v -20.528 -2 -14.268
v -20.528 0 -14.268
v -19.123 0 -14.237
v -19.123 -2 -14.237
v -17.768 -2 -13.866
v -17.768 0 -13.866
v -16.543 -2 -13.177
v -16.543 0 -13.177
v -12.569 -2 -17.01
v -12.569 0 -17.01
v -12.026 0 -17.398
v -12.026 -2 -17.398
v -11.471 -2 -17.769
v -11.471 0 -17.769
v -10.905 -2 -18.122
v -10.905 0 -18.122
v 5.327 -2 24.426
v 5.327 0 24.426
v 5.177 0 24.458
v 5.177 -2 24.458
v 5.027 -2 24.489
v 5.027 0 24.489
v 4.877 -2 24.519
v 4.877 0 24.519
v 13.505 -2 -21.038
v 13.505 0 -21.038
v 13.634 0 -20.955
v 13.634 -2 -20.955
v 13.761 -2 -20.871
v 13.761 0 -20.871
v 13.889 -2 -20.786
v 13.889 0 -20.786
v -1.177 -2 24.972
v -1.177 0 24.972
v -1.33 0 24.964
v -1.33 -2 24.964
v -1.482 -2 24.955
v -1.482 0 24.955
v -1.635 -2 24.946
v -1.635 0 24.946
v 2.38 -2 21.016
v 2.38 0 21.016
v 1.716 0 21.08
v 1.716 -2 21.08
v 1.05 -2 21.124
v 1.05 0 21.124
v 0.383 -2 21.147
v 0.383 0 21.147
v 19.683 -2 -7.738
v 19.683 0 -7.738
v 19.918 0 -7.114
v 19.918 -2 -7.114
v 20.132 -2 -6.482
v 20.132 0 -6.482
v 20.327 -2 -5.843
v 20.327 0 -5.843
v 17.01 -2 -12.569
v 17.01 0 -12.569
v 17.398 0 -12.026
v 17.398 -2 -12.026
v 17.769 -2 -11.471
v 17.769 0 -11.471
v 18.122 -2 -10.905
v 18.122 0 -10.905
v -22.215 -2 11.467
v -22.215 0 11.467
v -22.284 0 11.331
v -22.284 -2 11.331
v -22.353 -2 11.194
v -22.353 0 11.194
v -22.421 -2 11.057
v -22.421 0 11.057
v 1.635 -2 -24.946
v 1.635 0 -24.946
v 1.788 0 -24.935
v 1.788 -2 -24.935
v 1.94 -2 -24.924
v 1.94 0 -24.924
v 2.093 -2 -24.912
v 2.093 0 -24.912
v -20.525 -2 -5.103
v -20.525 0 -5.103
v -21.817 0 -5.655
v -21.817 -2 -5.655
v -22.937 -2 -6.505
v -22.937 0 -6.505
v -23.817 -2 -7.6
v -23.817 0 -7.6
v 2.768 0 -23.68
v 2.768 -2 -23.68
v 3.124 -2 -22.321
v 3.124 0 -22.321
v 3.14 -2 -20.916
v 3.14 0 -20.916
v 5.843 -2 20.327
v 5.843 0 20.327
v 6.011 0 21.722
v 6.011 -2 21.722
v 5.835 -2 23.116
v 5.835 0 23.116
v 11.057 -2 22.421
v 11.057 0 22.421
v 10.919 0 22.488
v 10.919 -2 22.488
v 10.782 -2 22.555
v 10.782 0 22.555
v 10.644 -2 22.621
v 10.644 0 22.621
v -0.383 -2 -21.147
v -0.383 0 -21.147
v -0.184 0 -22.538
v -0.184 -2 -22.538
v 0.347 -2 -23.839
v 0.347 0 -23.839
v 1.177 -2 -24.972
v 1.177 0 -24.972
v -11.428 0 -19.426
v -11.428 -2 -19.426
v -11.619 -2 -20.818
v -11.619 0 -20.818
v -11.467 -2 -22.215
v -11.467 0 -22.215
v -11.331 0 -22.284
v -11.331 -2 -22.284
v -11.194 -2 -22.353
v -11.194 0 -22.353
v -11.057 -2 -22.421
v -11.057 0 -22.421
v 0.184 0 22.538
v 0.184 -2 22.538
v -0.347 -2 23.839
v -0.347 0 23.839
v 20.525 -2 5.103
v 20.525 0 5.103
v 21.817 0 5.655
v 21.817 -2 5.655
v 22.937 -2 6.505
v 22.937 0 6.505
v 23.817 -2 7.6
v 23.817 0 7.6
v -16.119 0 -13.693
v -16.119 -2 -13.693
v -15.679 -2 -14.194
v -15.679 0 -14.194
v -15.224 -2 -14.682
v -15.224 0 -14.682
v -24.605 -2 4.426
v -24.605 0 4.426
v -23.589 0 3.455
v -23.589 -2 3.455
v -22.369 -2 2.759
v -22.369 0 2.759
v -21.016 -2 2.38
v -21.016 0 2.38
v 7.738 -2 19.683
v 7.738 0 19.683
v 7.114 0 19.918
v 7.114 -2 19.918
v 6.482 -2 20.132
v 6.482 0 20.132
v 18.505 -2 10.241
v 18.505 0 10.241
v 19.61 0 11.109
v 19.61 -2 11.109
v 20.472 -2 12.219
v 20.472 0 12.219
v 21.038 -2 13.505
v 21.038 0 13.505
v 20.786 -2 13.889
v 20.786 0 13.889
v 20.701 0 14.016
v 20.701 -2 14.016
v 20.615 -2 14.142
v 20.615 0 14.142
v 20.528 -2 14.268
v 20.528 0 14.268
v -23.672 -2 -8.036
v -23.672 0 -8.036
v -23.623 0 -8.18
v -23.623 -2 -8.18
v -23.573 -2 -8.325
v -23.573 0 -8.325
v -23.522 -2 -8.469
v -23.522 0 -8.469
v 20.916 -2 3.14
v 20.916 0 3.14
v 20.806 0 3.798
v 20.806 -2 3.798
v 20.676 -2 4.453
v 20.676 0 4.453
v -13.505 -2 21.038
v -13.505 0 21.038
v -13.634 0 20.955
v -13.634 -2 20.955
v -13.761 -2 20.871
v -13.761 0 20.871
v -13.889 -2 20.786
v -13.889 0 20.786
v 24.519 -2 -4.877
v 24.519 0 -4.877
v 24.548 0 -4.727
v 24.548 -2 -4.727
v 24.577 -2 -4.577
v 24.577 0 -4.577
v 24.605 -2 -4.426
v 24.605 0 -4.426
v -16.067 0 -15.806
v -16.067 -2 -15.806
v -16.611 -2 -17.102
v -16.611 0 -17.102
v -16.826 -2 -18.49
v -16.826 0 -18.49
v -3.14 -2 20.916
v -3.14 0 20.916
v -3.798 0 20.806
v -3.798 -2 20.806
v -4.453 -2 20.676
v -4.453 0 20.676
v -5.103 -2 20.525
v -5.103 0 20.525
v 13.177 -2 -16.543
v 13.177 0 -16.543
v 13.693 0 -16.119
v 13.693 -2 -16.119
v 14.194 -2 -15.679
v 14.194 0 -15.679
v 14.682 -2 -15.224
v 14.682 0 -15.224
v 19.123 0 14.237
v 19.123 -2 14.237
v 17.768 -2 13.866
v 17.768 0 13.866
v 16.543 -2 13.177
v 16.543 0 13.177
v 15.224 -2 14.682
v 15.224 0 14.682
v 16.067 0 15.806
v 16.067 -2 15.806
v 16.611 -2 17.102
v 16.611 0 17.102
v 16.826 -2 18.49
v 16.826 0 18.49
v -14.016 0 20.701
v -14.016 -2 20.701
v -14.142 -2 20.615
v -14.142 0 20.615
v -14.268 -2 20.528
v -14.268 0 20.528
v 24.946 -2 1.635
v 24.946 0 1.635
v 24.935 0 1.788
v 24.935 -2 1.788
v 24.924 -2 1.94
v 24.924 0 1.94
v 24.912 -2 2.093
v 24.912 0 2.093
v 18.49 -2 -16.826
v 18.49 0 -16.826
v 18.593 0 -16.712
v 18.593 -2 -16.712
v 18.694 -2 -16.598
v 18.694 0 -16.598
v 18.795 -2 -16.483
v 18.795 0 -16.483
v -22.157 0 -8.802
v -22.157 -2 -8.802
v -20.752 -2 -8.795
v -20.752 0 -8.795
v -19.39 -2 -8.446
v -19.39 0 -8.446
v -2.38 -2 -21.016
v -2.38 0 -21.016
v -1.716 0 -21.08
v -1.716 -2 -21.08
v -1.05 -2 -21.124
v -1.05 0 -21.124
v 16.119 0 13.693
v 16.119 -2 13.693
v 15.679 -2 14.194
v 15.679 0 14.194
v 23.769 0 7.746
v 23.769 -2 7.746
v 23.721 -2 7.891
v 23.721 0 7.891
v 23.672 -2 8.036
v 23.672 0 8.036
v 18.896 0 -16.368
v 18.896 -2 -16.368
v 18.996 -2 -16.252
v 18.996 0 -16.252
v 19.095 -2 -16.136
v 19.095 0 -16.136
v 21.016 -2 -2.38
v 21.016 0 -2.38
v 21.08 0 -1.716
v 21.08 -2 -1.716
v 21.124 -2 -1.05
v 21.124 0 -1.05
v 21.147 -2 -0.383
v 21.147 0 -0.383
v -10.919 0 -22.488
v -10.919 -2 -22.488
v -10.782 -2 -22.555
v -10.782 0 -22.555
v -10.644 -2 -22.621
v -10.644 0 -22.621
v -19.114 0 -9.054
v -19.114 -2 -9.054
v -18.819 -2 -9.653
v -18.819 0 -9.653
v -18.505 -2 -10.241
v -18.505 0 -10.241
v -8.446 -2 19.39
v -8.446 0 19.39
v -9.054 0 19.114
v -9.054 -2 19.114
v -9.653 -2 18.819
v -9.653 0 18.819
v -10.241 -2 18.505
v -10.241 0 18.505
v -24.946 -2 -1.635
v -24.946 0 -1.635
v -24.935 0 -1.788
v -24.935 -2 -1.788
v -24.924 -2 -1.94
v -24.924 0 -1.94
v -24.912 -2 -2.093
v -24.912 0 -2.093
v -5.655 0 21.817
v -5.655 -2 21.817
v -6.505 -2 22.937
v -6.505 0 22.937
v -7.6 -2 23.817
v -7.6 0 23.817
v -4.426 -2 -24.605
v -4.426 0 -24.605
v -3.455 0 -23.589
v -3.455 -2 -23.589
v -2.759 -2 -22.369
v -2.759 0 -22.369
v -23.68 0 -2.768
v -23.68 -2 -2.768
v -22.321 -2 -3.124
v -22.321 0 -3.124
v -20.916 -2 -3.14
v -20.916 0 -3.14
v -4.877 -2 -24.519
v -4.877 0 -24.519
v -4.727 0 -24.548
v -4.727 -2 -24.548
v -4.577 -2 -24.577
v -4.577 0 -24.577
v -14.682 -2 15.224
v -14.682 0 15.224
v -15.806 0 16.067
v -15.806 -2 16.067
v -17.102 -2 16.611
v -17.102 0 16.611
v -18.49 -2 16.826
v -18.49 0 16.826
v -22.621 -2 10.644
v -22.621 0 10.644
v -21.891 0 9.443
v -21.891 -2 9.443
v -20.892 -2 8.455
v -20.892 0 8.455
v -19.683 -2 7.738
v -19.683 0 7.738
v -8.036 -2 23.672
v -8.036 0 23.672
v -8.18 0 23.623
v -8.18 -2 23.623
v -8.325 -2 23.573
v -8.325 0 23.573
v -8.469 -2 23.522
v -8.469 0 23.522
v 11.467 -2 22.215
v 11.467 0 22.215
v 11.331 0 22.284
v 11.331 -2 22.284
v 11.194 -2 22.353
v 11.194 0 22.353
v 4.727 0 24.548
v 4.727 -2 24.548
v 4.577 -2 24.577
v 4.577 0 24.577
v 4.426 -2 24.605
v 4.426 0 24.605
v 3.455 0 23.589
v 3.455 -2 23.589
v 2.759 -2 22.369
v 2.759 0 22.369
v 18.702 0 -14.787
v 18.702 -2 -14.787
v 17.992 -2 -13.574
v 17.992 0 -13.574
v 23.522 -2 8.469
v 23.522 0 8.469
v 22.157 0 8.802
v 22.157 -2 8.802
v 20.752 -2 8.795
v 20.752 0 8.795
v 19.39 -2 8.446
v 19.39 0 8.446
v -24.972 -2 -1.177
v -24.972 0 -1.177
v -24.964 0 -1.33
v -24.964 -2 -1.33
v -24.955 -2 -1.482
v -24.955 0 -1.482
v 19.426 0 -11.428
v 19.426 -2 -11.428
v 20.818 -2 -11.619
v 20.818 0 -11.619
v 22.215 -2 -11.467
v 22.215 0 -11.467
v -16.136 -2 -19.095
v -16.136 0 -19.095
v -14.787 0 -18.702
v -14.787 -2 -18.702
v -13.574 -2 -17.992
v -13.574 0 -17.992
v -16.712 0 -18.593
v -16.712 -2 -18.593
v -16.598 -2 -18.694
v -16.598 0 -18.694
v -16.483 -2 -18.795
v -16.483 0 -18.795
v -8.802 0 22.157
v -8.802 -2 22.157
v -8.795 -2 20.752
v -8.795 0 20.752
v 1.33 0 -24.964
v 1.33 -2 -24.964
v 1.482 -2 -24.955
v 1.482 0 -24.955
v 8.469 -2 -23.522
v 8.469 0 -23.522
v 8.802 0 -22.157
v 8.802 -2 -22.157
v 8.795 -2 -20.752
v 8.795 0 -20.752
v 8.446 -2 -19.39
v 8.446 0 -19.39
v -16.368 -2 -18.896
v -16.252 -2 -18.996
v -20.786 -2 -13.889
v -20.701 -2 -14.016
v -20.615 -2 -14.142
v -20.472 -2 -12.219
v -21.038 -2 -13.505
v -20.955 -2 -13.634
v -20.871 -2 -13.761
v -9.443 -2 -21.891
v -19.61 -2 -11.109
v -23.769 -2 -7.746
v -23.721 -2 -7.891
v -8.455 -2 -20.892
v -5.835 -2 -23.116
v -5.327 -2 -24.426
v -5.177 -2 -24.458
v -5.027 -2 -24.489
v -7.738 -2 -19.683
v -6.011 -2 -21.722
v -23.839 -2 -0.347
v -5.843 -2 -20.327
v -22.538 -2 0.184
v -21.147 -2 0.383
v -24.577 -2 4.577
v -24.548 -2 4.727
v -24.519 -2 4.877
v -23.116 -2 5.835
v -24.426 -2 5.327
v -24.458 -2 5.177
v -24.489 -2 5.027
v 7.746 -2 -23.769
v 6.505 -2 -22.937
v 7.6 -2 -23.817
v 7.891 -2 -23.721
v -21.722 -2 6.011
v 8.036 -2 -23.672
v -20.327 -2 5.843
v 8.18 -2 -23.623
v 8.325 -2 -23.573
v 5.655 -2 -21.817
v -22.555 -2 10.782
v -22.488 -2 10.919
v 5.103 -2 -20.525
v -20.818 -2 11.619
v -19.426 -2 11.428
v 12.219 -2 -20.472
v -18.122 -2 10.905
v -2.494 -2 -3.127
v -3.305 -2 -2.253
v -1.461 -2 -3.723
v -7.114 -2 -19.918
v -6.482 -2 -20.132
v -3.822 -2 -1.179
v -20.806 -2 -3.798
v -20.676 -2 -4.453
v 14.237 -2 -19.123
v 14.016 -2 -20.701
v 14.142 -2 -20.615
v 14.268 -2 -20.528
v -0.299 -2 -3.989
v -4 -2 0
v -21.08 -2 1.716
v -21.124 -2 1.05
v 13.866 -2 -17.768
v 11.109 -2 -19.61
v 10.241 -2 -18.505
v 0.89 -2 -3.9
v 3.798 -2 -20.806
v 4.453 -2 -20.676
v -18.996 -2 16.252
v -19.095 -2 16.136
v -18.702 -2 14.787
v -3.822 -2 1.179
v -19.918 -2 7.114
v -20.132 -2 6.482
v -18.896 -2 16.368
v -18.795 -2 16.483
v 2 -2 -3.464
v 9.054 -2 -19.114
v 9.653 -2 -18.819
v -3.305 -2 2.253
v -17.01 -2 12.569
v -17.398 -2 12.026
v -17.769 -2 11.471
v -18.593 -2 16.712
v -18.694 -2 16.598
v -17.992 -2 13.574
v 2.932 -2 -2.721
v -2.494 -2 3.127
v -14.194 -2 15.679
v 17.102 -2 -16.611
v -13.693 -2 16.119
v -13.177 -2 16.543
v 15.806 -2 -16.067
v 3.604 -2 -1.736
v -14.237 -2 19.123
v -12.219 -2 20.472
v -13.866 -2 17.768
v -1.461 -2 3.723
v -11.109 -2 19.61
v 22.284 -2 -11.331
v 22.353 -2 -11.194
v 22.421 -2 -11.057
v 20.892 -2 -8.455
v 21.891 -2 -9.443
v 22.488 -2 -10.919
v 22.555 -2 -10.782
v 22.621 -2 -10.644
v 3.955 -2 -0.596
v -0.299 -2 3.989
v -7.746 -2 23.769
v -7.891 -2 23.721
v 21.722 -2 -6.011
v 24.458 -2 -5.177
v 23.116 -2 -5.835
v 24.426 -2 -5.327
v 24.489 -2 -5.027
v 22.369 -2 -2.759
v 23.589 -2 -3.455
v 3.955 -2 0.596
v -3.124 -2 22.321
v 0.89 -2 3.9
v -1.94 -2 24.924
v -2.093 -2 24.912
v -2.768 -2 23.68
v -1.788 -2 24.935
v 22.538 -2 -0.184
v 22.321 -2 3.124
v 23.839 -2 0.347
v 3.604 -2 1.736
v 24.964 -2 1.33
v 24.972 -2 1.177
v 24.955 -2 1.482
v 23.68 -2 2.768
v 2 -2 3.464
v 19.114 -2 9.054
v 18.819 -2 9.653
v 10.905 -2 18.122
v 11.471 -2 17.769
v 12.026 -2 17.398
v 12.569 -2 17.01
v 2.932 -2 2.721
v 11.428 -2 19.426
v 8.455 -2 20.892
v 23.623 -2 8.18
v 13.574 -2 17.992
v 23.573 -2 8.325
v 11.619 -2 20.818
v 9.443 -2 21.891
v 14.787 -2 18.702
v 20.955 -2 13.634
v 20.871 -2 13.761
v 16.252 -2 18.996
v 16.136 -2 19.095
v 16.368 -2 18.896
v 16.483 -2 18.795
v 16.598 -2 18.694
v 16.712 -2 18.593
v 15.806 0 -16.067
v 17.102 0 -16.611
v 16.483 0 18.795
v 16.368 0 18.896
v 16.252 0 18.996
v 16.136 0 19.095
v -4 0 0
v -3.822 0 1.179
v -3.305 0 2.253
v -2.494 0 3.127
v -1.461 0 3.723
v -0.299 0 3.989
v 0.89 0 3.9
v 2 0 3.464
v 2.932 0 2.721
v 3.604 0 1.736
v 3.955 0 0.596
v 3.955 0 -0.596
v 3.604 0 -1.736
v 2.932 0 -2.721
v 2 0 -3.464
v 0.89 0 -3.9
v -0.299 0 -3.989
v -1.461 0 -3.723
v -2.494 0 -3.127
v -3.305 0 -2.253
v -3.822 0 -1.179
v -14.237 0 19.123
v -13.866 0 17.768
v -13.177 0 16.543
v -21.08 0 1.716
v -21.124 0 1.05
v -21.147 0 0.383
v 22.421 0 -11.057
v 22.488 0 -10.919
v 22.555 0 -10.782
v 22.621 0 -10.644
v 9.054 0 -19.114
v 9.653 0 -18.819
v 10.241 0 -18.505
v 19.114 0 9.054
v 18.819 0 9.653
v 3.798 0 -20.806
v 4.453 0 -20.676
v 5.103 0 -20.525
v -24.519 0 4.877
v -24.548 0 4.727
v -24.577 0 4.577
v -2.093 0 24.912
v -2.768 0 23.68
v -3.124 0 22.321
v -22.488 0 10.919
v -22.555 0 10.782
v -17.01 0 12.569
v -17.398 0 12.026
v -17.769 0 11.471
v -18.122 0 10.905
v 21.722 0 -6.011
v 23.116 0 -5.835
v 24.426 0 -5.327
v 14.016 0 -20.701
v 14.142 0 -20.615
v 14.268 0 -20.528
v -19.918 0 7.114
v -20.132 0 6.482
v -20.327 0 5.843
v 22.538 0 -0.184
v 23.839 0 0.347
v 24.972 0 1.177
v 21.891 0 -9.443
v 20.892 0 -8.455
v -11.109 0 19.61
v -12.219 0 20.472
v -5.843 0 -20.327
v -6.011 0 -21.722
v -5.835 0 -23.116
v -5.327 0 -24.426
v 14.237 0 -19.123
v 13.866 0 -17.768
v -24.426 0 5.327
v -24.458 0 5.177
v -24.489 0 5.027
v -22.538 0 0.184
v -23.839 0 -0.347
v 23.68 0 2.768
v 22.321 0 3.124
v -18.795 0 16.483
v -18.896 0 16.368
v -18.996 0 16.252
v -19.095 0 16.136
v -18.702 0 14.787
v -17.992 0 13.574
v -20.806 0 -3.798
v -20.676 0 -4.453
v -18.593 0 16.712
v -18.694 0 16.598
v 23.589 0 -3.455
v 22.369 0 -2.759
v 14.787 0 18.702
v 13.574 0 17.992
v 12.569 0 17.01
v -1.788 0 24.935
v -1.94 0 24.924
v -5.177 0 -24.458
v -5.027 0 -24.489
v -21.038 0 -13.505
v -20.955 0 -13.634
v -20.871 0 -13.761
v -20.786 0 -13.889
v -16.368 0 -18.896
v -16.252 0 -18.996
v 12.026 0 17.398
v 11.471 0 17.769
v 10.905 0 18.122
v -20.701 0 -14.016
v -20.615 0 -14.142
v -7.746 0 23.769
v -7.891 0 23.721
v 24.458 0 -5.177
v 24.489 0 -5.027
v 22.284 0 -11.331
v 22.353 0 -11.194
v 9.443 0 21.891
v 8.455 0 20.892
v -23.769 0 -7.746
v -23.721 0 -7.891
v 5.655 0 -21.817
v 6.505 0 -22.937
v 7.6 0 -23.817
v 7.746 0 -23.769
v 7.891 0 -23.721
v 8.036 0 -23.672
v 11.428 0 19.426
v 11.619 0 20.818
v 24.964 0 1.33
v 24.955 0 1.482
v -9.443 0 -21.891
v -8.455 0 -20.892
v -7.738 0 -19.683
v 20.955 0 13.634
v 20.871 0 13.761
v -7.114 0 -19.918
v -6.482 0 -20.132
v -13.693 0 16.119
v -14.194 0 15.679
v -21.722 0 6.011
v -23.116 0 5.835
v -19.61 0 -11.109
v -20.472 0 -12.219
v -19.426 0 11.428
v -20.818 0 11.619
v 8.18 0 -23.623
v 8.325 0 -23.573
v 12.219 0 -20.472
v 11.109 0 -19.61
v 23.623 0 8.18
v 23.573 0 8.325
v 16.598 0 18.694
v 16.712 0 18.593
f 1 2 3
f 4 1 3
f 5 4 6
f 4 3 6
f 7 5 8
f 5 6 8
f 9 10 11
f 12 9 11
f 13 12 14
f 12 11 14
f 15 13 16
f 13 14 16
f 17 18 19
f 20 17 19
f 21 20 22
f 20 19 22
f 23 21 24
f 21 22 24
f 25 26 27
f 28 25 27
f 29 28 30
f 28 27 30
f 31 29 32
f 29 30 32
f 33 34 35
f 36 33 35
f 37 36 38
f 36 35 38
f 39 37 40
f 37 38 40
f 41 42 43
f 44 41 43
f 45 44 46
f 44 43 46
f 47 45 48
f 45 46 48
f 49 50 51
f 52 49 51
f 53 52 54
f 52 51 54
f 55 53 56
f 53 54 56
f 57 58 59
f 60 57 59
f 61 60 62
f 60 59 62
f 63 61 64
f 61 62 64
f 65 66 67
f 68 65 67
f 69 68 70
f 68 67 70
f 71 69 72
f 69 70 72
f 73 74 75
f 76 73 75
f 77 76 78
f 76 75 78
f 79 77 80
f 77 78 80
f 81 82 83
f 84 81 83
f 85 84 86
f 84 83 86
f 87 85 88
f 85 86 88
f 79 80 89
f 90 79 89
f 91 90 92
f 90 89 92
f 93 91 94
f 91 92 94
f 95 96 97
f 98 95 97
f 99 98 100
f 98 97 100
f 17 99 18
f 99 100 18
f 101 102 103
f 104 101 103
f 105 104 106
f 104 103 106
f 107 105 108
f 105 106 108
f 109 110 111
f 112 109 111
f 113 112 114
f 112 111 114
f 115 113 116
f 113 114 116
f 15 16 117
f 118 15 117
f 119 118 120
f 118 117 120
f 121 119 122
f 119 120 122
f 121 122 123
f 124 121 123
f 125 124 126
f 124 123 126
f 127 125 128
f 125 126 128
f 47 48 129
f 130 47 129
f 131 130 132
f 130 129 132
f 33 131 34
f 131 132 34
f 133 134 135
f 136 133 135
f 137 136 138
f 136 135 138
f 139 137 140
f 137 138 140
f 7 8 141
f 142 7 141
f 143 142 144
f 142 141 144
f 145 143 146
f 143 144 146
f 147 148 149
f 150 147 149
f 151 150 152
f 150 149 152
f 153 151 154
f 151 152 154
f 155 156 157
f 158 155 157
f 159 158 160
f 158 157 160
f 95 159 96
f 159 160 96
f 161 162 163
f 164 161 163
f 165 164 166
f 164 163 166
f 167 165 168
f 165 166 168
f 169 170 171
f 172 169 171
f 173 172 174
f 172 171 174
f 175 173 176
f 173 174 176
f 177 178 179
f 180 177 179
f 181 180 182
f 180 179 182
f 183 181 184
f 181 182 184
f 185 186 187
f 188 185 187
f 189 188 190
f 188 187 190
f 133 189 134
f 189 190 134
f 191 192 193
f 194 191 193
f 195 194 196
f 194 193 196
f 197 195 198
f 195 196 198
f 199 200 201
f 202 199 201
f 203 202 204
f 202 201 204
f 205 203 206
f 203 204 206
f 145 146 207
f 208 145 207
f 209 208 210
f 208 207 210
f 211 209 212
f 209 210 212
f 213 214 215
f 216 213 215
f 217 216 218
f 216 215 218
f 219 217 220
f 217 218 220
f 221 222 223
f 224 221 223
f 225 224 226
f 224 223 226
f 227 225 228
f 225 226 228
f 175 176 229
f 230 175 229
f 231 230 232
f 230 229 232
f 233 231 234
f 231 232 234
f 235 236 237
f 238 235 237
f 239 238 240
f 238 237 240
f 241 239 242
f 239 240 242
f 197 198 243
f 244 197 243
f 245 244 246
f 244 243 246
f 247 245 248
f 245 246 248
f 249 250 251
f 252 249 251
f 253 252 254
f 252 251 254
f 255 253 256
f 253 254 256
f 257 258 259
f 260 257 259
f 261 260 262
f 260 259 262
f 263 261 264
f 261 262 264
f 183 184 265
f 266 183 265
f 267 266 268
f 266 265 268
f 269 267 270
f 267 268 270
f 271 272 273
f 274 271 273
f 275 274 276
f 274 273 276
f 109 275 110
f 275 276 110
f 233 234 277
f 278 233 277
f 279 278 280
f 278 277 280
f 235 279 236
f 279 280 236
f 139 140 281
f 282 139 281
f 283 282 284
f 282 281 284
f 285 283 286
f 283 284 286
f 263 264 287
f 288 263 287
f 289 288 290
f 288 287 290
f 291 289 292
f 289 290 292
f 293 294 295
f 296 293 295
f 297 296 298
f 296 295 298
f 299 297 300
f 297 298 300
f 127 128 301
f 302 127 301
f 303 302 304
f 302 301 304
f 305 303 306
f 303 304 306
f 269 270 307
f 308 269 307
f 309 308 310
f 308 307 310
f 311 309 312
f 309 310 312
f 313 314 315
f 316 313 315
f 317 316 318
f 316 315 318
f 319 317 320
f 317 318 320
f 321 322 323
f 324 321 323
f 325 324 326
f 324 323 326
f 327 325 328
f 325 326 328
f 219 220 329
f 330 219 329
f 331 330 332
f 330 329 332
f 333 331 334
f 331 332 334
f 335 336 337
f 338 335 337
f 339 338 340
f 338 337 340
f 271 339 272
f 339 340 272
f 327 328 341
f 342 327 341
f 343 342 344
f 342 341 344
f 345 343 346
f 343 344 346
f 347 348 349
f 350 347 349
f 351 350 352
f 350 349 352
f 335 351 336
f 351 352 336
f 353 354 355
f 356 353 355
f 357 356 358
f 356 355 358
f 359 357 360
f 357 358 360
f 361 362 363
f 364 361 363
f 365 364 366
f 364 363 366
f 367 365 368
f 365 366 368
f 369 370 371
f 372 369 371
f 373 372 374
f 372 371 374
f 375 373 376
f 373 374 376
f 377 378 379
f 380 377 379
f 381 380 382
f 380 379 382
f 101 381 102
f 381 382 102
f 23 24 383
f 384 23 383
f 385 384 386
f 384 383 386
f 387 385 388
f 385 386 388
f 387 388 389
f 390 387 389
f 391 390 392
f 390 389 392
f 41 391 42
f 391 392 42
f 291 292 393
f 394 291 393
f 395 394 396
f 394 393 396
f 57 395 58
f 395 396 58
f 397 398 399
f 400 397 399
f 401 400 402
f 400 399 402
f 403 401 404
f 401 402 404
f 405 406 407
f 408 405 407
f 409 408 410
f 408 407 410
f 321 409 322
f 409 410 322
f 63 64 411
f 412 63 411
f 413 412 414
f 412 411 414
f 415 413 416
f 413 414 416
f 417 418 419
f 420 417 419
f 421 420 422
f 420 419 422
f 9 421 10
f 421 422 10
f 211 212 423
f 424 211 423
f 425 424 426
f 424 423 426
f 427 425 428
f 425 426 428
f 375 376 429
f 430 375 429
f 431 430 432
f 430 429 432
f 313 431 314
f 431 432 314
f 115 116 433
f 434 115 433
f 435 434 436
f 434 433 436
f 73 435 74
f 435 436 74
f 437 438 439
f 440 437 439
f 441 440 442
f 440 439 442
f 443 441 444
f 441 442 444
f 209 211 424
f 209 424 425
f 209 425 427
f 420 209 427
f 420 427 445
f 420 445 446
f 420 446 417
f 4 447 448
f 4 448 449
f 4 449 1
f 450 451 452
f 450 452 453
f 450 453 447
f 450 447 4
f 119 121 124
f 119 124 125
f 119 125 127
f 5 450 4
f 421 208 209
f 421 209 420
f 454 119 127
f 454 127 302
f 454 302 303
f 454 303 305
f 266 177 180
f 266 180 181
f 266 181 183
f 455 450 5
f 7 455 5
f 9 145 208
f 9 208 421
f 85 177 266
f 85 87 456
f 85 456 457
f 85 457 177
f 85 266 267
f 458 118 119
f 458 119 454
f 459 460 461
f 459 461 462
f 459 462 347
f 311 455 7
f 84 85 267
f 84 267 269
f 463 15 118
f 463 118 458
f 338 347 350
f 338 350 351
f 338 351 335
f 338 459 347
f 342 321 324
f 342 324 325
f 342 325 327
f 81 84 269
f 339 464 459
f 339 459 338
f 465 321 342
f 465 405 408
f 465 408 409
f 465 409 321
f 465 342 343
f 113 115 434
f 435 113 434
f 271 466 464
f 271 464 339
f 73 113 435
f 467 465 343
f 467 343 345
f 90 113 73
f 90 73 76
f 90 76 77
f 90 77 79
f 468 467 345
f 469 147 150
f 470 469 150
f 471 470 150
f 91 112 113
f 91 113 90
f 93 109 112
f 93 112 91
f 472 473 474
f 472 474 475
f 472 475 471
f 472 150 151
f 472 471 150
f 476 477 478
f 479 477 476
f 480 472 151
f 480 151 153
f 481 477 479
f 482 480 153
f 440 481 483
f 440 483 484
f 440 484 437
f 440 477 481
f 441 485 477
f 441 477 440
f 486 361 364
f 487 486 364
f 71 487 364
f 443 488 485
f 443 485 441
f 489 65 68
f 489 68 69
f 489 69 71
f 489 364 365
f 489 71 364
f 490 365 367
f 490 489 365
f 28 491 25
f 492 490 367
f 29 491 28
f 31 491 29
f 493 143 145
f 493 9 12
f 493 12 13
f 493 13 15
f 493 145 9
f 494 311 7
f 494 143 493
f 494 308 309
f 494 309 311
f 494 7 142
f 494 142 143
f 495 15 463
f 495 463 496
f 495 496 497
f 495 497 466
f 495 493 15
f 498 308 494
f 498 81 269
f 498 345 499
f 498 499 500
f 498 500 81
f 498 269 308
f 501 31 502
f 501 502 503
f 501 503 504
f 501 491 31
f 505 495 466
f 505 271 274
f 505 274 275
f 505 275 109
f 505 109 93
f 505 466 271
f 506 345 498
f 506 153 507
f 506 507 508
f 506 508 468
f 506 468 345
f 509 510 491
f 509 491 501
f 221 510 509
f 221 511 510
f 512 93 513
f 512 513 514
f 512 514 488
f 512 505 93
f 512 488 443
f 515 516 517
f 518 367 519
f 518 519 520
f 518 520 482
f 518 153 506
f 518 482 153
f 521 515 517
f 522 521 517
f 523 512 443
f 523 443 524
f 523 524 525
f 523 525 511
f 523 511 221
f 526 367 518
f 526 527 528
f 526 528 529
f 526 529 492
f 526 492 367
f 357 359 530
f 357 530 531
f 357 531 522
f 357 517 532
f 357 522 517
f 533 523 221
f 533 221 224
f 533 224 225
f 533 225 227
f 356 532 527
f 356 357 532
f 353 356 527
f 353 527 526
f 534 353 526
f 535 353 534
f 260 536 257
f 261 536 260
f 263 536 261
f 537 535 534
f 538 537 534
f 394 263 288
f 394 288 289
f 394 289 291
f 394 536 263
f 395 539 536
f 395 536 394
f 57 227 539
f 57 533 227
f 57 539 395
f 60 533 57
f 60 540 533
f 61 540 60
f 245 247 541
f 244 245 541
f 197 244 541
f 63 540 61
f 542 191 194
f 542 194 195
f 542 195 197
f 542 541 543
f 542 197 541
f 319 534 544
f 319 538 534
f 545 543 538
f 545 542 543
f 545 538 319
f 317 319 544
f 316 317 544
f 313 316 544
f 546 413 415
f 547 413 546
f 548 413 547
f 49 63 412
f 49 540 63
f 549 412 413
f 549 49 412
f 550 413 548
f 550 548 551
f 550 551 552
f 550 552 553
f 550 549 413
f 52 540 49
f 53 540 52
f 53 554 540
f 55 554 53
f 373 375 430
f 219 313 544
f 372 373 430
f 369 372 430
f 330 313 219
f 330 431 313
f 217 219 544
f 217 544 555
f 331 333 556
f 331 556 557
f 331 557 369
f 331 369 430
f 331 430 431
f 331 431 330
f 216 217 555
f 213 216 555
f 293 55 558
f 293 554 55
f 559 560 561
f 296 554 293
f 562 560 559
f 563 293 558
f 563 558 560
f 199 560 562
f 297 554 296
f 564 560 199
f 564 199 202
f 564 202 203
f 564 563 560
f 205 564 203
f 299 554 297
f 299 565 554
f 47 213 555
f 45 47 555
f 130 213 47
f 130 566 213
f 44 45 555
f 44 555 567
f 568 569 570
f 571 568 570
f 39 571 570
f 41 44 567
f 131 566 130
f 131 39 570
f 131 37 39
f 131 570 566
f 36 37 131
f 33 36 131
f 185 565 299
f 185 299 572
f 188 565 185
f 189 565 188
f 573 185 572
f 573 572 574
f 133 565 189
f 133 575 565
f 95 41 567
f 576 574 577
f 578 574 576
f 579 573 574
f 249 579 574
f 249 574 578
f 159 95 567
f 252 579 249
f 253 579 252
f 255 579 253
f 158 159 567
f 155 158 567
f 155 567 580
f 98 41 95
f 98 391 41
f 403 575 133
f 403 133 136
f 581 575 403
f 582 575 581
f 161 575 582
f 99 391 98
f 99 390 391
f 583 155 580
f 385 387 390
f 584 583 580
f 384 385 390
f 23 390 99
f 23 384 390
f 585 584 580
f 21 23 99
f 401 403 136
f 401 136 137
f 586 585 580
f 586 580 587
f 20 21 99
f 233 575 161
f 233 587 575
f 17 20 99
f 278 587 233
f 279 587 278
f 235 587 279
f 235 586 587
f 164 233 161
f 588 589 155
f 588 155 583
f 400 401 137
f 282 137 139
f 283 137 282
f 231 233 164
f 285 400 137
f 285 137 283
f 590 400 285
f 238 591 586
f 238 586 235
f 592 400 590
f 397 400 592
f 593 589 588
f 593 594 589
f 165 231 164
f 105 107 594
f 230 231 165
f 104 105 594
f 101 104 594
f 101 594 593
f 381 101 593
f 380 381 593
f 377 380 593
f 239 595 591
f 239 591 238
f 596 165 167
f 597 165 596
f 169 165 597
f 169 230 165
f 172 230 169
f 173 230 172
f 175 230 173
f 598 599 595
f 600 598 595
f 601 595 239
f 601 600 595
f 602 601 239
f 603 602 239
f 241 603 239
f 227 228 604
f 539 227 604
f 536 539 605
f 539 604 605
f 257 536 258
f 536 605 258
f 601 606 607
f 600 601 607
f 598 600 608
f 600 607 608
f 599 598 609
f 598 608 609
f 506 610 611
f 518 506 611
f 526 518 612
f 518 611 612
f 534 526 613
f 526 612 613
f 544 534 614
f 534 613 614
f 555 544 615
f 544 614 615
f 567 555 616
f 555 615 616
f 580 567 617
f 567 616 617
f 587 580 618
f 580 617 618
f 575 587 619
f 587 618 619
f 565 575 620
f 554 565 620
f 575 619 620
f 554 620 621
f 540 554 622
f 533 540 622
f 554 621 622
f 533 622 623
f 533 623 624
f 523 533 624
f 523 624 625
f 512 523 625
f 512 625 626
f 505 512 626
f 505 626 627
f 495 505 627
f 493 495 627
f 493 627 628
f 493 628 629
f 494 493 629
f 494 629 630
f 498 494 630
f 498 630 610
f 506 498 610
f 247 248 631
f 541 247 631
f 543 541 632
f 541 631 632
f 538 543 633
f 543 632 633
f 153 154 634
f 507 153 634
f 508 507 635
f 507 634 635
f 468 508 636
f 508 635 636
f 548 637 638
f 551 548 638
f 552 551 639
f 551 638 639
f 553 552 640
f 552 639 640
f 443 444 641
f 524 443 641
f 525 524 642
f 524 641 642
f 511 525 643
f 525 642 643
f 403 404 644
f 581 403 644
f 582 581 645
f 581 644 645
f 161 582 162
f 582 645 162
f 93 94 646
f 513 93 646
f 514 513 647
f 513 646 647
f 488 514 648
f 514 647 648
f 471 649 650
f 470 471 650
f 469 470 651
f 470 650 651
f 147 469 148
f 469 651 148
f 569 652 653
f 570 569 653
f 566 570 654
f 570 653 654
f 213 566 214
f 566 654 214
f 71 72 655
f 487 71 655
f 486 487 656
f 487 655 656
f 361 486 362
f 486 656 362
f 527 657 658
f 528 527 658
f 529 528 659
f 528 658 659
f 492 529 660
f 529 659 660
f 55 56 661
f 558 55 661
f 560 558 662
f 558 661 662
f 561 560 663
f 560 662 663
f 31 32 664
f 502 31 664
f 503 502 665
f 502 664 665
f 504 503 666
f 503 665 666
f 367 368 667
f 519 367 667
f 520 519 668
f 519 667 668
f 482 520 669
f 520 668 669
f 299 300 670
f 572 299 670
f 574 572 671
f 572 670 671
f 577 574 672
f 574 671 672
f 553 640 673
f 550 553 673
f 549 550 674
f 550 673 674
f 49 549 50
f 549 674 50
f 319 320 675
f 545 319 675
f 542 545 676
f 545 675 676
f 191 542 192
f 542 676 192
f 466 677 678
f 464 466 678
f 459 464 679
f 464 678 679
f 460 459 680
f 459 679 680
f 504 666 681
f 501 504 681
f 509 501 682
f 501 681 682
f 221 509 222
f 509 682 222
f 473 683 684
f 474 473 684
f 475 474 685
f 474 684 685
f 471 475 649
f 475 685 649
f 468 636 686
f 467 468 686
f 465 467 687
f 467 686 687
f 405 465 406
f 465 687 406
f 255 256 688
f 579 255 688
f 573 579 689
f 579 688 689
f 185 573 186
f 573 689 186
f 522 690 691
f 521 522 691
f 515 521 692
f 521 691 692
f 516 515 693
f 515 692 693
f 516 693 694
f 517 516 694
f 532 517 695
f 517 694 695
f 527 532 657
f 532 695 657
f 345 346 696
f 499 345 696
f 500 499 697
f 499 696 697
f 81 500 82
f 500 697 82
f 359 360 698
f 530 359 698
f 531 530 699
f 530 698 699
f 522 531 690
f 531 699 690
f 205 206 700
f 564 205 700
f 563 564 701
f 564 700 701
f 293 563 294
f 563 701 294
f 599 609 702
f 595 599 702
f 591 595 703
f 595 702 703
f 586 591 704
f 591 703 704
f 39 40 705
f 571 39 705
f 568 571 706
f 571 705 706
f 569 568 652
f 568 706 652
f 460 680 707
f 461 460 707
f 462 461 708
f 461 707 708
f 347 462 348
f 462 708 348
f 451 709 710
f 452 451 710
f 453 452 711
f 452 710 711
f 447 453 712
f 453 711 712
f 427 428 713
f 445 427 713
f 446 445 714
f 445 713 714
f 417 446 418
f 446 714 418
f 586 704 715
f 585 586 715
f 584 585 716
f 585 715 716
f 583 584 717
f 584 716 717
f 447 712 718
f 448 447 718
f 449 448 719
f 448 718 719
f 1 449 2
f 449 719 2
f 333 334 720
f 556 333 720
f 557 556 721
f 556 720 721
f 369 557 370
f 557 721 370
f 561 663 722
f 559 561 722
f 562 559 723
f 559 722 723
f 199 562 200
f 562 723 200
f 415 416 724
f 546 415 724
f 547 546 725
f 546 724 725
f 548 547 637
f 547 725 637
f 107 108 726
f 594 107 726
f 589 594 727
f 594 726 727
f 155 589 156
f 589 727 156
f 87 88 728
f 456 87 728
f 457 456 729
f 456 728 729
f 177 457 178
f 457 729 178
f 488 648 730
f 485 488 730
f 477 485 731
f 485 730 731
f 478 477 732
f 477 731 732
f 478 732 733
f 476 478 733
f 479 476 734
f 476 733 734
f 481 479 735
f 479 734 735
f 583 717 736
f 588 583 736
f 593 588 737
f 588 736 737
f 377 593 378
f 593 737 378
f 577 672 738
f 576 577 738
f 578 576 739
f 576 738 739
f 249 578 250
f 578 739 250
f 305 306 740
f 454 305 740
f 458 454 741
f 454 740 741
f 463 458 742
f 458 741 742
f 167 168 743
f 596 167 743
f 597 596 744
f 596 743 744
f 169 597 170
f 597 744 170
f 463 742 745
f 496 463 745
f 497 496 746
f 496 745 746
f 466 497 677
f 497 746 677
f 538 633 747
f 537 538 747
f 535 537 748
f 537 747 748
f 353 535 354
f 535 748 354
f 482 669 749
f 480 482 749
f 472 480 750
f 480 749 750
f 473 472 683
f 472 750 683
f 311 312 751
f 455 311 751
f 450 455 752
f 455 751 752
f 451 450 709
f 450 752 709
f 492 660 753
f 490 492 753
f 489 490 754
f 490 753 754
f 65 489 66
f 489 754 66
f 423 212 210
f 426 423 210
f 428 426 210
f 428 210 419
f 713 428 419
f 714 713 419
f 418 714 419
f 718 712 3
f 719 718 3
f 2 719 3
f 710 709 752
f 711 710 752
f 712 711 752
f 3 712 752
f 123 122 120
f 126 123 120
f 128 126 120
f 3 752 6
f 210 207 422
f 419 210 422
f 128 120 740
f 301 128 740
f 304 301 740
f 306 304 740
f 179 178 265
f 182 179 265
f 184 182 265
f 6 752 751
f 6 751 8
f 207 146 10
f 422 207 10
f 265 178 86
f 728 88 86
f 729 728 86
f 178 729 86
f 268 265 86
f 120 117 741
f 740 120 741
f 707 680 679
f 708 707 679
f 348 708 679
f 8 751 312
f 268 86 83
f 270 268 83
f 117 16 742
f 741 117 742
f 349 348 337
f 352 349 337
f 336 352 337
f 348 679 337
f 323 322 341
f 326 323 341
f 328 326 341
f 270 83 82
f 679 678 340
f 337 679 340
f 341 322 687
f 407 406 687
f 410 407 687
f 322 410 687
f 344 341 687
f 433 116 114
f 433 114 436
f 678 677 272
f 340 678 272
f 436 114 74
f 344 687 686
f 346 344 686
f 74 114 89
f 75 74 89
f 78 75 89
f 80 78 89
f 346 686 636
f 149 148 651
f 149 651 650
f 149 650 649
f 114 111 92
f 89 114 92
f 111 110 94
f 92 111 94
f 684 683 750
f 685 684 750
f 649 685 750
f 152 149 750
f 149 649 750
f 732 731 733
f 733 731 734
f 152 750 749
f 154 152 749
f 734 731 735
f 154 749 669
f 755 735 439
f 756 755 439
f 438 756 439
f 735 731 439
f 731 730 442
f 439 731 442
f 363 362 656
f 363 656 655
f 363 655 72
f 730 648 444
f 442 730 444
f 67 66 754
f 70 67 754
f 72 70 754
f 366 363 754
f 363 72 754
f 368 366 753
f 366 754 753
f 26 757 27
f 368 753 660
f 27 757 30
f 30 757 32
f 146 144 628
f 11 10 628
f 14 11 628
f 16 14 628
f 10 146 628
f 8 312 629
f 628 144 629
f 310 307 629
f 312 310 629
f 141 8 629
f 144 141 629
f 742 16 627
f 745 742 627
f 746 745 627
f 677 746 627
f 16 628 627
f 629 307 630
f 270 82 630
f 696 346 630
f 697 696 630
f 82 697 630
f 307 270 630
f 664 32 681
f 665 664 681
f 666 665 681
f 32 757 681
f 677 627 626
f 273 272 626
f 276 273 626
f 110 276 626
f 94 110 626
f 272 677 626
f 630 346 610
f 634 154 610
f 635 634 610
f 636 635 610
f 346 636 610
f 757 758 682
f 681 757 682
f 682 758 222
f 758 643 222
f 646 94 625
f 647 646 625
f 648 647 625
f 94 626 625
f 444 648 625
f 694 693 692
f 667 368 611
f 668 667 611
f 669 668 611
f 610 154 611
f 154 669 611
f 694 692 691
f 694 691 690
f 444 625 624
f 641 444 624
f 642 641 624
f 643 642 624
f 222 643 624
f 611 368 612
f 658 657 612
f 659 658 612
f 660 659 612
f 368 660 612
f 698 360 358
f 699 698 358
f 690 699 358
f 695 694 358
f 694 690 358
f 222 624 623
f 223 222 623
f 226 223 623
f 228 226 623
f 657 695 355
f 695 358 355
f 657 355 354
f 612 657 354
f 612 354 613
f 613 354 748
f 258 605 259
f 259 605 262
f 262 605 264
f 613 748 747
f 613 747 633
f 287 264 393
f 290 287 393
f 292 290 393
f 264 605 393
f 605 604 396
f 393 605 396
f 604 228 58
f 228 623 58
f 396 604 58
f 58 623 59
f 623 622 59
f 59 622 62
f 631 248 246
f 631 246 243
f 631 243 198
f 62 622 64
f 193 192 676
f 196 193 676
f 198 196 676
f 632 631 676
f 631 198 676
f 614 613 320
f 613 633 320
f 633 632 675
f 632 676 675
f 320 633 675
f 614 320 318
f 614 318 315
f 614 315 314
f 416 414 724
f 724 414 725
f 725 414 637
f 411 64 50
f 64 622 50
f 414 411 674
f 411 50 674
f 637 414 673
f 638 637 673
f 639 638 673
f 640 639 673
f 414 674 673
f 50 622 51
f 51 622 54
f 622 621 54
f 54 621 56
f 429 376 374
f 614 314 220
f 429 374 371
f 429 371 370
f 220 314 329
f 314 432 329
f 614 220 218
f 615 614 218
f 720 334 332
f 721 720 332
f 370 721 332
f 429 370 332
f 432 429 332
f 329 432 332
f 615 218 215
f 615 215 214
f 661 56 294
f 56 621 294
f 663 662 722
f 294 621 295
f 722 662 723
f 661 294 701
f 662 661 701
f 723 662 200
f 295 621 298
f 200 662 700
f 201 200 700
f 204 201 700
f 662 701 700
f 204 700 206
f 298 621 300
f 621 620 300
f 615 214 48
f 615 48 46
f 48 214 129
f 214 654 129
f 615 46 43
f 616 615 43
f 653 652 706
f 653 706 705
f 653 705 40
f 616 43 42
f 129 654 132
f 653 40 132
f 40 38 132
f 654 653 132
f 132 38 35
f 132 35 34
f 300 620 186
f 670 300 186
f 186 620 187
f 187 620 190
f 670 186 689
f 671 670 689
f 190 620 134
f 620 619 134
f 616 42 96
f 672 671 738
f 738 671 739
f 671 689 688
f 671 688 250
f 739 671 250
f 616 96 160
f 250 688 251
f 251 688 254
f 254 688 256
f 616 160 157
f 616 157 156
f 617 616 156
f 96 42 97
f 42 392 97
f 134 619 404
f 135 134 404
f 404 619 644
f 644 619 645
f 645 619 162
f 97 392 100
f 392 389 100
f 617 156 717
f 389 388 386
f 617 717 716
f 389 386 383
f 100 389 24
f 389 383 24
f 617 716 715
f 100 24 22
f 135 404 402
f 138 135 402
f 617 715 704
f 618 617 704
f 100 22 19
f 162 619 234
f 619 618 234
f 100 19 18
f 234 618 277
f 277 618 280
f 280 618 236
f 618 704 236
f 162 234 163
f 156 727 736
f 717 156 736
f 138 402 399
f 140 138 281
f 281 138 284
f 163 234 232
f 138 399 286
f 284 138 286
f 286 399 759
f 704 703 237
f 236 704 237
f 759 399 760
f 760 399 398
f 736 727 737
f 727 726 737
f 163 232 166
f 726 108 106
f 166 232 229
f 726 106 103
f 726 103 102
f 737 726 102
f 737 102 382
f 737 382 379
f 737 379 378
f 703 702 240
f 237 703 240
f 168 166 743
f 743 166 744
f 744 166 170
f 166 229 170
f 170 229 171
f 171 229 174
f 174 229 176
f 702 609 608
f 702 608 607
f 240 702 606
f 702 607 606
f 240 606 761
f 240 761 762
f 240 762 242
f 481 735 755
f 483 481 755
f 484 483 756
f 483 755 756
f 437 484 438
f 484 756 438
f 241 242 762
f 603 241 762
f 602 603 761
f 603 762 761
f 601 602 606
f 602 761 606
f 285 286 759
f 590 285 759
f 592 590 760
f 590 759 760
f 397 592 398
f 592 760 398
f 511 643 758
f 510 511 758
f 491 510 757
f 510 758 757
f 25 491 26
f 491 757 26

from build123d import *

# Parameters (mm, degrees)
F1_DEPTH = 2
F2_COUNT = 24
F4_D     = 8


with BuildPart() as f1:
    # F0 (on Front) → F1 (new body)
    with BuildSketch(Plane.XZ):
        with BuildLine():
            ThreePointArc((-3.140047, 20.915607), (-13.800553, -16.027078), (21.15, 0))
            ThreePointArc((21.15, 0), (15.090164, 14.819226), (0.383149, 21.146529))
            ThreePointArc((0.383149, 21.146529), (-0.500501, 21.144077), (-1.383276, 21.104716))
            ThreePointArc((-1.383276, 21.104716), (-2.263637, 21.028515), (-3.140047, 20.915607))
        make_face()
        with BuildLine():
            ThreePointArc((-2.092742, 24.912255), (-2.987759, 23.011245), (-3.140047, 20.915607))
            ThreePointArc((-3.140047, 20.915607), (-2.263637, 21.028515), (-1.383276, 21.104716))
            Line((-1.383276, 21.104716), (-1.635023, 24.945625))
            ThreePointArc((-1.635023, 24.945625), (-1.863943, 24.929779), (-2.092742, 24.912255))
        make_face()
        with BuildLine():
            ThreePointArc((-1.383276, 21.104716), (-0.500501, 21.144077), (0.383149, 21.146529))
            ThreePointArc((0.383149, 21.146529), (-0.041372, 23.204362), (-1.176863, 24.972284))
            ThreePointArc((-1.176863, 24.972284), (-1.405992, 24.959794), (-1.635023, 24.945625))
            Line((-1.635023, 24.945625), (-1.383276, 21.104716))
        make_face()
    extrude(amount=F1_DEPTH)

    # F2: F1 ×24 about axis
    f2_axis = Axis((0, 0, 0), (0, -1, 0))


with BuildPart() as f1_1:
    add(f1.part)
    for i in range(1, F2_COUNT):
        add(f1.part.rotate(f2_axis, i * 360 / F2_COUNT))

    # F4 (through all)
    with Locations(Plane.XZ.offset(2)):
        with Locations((0, 0)):
            Hole(F4_D / 2)


solid = f1_1.part
